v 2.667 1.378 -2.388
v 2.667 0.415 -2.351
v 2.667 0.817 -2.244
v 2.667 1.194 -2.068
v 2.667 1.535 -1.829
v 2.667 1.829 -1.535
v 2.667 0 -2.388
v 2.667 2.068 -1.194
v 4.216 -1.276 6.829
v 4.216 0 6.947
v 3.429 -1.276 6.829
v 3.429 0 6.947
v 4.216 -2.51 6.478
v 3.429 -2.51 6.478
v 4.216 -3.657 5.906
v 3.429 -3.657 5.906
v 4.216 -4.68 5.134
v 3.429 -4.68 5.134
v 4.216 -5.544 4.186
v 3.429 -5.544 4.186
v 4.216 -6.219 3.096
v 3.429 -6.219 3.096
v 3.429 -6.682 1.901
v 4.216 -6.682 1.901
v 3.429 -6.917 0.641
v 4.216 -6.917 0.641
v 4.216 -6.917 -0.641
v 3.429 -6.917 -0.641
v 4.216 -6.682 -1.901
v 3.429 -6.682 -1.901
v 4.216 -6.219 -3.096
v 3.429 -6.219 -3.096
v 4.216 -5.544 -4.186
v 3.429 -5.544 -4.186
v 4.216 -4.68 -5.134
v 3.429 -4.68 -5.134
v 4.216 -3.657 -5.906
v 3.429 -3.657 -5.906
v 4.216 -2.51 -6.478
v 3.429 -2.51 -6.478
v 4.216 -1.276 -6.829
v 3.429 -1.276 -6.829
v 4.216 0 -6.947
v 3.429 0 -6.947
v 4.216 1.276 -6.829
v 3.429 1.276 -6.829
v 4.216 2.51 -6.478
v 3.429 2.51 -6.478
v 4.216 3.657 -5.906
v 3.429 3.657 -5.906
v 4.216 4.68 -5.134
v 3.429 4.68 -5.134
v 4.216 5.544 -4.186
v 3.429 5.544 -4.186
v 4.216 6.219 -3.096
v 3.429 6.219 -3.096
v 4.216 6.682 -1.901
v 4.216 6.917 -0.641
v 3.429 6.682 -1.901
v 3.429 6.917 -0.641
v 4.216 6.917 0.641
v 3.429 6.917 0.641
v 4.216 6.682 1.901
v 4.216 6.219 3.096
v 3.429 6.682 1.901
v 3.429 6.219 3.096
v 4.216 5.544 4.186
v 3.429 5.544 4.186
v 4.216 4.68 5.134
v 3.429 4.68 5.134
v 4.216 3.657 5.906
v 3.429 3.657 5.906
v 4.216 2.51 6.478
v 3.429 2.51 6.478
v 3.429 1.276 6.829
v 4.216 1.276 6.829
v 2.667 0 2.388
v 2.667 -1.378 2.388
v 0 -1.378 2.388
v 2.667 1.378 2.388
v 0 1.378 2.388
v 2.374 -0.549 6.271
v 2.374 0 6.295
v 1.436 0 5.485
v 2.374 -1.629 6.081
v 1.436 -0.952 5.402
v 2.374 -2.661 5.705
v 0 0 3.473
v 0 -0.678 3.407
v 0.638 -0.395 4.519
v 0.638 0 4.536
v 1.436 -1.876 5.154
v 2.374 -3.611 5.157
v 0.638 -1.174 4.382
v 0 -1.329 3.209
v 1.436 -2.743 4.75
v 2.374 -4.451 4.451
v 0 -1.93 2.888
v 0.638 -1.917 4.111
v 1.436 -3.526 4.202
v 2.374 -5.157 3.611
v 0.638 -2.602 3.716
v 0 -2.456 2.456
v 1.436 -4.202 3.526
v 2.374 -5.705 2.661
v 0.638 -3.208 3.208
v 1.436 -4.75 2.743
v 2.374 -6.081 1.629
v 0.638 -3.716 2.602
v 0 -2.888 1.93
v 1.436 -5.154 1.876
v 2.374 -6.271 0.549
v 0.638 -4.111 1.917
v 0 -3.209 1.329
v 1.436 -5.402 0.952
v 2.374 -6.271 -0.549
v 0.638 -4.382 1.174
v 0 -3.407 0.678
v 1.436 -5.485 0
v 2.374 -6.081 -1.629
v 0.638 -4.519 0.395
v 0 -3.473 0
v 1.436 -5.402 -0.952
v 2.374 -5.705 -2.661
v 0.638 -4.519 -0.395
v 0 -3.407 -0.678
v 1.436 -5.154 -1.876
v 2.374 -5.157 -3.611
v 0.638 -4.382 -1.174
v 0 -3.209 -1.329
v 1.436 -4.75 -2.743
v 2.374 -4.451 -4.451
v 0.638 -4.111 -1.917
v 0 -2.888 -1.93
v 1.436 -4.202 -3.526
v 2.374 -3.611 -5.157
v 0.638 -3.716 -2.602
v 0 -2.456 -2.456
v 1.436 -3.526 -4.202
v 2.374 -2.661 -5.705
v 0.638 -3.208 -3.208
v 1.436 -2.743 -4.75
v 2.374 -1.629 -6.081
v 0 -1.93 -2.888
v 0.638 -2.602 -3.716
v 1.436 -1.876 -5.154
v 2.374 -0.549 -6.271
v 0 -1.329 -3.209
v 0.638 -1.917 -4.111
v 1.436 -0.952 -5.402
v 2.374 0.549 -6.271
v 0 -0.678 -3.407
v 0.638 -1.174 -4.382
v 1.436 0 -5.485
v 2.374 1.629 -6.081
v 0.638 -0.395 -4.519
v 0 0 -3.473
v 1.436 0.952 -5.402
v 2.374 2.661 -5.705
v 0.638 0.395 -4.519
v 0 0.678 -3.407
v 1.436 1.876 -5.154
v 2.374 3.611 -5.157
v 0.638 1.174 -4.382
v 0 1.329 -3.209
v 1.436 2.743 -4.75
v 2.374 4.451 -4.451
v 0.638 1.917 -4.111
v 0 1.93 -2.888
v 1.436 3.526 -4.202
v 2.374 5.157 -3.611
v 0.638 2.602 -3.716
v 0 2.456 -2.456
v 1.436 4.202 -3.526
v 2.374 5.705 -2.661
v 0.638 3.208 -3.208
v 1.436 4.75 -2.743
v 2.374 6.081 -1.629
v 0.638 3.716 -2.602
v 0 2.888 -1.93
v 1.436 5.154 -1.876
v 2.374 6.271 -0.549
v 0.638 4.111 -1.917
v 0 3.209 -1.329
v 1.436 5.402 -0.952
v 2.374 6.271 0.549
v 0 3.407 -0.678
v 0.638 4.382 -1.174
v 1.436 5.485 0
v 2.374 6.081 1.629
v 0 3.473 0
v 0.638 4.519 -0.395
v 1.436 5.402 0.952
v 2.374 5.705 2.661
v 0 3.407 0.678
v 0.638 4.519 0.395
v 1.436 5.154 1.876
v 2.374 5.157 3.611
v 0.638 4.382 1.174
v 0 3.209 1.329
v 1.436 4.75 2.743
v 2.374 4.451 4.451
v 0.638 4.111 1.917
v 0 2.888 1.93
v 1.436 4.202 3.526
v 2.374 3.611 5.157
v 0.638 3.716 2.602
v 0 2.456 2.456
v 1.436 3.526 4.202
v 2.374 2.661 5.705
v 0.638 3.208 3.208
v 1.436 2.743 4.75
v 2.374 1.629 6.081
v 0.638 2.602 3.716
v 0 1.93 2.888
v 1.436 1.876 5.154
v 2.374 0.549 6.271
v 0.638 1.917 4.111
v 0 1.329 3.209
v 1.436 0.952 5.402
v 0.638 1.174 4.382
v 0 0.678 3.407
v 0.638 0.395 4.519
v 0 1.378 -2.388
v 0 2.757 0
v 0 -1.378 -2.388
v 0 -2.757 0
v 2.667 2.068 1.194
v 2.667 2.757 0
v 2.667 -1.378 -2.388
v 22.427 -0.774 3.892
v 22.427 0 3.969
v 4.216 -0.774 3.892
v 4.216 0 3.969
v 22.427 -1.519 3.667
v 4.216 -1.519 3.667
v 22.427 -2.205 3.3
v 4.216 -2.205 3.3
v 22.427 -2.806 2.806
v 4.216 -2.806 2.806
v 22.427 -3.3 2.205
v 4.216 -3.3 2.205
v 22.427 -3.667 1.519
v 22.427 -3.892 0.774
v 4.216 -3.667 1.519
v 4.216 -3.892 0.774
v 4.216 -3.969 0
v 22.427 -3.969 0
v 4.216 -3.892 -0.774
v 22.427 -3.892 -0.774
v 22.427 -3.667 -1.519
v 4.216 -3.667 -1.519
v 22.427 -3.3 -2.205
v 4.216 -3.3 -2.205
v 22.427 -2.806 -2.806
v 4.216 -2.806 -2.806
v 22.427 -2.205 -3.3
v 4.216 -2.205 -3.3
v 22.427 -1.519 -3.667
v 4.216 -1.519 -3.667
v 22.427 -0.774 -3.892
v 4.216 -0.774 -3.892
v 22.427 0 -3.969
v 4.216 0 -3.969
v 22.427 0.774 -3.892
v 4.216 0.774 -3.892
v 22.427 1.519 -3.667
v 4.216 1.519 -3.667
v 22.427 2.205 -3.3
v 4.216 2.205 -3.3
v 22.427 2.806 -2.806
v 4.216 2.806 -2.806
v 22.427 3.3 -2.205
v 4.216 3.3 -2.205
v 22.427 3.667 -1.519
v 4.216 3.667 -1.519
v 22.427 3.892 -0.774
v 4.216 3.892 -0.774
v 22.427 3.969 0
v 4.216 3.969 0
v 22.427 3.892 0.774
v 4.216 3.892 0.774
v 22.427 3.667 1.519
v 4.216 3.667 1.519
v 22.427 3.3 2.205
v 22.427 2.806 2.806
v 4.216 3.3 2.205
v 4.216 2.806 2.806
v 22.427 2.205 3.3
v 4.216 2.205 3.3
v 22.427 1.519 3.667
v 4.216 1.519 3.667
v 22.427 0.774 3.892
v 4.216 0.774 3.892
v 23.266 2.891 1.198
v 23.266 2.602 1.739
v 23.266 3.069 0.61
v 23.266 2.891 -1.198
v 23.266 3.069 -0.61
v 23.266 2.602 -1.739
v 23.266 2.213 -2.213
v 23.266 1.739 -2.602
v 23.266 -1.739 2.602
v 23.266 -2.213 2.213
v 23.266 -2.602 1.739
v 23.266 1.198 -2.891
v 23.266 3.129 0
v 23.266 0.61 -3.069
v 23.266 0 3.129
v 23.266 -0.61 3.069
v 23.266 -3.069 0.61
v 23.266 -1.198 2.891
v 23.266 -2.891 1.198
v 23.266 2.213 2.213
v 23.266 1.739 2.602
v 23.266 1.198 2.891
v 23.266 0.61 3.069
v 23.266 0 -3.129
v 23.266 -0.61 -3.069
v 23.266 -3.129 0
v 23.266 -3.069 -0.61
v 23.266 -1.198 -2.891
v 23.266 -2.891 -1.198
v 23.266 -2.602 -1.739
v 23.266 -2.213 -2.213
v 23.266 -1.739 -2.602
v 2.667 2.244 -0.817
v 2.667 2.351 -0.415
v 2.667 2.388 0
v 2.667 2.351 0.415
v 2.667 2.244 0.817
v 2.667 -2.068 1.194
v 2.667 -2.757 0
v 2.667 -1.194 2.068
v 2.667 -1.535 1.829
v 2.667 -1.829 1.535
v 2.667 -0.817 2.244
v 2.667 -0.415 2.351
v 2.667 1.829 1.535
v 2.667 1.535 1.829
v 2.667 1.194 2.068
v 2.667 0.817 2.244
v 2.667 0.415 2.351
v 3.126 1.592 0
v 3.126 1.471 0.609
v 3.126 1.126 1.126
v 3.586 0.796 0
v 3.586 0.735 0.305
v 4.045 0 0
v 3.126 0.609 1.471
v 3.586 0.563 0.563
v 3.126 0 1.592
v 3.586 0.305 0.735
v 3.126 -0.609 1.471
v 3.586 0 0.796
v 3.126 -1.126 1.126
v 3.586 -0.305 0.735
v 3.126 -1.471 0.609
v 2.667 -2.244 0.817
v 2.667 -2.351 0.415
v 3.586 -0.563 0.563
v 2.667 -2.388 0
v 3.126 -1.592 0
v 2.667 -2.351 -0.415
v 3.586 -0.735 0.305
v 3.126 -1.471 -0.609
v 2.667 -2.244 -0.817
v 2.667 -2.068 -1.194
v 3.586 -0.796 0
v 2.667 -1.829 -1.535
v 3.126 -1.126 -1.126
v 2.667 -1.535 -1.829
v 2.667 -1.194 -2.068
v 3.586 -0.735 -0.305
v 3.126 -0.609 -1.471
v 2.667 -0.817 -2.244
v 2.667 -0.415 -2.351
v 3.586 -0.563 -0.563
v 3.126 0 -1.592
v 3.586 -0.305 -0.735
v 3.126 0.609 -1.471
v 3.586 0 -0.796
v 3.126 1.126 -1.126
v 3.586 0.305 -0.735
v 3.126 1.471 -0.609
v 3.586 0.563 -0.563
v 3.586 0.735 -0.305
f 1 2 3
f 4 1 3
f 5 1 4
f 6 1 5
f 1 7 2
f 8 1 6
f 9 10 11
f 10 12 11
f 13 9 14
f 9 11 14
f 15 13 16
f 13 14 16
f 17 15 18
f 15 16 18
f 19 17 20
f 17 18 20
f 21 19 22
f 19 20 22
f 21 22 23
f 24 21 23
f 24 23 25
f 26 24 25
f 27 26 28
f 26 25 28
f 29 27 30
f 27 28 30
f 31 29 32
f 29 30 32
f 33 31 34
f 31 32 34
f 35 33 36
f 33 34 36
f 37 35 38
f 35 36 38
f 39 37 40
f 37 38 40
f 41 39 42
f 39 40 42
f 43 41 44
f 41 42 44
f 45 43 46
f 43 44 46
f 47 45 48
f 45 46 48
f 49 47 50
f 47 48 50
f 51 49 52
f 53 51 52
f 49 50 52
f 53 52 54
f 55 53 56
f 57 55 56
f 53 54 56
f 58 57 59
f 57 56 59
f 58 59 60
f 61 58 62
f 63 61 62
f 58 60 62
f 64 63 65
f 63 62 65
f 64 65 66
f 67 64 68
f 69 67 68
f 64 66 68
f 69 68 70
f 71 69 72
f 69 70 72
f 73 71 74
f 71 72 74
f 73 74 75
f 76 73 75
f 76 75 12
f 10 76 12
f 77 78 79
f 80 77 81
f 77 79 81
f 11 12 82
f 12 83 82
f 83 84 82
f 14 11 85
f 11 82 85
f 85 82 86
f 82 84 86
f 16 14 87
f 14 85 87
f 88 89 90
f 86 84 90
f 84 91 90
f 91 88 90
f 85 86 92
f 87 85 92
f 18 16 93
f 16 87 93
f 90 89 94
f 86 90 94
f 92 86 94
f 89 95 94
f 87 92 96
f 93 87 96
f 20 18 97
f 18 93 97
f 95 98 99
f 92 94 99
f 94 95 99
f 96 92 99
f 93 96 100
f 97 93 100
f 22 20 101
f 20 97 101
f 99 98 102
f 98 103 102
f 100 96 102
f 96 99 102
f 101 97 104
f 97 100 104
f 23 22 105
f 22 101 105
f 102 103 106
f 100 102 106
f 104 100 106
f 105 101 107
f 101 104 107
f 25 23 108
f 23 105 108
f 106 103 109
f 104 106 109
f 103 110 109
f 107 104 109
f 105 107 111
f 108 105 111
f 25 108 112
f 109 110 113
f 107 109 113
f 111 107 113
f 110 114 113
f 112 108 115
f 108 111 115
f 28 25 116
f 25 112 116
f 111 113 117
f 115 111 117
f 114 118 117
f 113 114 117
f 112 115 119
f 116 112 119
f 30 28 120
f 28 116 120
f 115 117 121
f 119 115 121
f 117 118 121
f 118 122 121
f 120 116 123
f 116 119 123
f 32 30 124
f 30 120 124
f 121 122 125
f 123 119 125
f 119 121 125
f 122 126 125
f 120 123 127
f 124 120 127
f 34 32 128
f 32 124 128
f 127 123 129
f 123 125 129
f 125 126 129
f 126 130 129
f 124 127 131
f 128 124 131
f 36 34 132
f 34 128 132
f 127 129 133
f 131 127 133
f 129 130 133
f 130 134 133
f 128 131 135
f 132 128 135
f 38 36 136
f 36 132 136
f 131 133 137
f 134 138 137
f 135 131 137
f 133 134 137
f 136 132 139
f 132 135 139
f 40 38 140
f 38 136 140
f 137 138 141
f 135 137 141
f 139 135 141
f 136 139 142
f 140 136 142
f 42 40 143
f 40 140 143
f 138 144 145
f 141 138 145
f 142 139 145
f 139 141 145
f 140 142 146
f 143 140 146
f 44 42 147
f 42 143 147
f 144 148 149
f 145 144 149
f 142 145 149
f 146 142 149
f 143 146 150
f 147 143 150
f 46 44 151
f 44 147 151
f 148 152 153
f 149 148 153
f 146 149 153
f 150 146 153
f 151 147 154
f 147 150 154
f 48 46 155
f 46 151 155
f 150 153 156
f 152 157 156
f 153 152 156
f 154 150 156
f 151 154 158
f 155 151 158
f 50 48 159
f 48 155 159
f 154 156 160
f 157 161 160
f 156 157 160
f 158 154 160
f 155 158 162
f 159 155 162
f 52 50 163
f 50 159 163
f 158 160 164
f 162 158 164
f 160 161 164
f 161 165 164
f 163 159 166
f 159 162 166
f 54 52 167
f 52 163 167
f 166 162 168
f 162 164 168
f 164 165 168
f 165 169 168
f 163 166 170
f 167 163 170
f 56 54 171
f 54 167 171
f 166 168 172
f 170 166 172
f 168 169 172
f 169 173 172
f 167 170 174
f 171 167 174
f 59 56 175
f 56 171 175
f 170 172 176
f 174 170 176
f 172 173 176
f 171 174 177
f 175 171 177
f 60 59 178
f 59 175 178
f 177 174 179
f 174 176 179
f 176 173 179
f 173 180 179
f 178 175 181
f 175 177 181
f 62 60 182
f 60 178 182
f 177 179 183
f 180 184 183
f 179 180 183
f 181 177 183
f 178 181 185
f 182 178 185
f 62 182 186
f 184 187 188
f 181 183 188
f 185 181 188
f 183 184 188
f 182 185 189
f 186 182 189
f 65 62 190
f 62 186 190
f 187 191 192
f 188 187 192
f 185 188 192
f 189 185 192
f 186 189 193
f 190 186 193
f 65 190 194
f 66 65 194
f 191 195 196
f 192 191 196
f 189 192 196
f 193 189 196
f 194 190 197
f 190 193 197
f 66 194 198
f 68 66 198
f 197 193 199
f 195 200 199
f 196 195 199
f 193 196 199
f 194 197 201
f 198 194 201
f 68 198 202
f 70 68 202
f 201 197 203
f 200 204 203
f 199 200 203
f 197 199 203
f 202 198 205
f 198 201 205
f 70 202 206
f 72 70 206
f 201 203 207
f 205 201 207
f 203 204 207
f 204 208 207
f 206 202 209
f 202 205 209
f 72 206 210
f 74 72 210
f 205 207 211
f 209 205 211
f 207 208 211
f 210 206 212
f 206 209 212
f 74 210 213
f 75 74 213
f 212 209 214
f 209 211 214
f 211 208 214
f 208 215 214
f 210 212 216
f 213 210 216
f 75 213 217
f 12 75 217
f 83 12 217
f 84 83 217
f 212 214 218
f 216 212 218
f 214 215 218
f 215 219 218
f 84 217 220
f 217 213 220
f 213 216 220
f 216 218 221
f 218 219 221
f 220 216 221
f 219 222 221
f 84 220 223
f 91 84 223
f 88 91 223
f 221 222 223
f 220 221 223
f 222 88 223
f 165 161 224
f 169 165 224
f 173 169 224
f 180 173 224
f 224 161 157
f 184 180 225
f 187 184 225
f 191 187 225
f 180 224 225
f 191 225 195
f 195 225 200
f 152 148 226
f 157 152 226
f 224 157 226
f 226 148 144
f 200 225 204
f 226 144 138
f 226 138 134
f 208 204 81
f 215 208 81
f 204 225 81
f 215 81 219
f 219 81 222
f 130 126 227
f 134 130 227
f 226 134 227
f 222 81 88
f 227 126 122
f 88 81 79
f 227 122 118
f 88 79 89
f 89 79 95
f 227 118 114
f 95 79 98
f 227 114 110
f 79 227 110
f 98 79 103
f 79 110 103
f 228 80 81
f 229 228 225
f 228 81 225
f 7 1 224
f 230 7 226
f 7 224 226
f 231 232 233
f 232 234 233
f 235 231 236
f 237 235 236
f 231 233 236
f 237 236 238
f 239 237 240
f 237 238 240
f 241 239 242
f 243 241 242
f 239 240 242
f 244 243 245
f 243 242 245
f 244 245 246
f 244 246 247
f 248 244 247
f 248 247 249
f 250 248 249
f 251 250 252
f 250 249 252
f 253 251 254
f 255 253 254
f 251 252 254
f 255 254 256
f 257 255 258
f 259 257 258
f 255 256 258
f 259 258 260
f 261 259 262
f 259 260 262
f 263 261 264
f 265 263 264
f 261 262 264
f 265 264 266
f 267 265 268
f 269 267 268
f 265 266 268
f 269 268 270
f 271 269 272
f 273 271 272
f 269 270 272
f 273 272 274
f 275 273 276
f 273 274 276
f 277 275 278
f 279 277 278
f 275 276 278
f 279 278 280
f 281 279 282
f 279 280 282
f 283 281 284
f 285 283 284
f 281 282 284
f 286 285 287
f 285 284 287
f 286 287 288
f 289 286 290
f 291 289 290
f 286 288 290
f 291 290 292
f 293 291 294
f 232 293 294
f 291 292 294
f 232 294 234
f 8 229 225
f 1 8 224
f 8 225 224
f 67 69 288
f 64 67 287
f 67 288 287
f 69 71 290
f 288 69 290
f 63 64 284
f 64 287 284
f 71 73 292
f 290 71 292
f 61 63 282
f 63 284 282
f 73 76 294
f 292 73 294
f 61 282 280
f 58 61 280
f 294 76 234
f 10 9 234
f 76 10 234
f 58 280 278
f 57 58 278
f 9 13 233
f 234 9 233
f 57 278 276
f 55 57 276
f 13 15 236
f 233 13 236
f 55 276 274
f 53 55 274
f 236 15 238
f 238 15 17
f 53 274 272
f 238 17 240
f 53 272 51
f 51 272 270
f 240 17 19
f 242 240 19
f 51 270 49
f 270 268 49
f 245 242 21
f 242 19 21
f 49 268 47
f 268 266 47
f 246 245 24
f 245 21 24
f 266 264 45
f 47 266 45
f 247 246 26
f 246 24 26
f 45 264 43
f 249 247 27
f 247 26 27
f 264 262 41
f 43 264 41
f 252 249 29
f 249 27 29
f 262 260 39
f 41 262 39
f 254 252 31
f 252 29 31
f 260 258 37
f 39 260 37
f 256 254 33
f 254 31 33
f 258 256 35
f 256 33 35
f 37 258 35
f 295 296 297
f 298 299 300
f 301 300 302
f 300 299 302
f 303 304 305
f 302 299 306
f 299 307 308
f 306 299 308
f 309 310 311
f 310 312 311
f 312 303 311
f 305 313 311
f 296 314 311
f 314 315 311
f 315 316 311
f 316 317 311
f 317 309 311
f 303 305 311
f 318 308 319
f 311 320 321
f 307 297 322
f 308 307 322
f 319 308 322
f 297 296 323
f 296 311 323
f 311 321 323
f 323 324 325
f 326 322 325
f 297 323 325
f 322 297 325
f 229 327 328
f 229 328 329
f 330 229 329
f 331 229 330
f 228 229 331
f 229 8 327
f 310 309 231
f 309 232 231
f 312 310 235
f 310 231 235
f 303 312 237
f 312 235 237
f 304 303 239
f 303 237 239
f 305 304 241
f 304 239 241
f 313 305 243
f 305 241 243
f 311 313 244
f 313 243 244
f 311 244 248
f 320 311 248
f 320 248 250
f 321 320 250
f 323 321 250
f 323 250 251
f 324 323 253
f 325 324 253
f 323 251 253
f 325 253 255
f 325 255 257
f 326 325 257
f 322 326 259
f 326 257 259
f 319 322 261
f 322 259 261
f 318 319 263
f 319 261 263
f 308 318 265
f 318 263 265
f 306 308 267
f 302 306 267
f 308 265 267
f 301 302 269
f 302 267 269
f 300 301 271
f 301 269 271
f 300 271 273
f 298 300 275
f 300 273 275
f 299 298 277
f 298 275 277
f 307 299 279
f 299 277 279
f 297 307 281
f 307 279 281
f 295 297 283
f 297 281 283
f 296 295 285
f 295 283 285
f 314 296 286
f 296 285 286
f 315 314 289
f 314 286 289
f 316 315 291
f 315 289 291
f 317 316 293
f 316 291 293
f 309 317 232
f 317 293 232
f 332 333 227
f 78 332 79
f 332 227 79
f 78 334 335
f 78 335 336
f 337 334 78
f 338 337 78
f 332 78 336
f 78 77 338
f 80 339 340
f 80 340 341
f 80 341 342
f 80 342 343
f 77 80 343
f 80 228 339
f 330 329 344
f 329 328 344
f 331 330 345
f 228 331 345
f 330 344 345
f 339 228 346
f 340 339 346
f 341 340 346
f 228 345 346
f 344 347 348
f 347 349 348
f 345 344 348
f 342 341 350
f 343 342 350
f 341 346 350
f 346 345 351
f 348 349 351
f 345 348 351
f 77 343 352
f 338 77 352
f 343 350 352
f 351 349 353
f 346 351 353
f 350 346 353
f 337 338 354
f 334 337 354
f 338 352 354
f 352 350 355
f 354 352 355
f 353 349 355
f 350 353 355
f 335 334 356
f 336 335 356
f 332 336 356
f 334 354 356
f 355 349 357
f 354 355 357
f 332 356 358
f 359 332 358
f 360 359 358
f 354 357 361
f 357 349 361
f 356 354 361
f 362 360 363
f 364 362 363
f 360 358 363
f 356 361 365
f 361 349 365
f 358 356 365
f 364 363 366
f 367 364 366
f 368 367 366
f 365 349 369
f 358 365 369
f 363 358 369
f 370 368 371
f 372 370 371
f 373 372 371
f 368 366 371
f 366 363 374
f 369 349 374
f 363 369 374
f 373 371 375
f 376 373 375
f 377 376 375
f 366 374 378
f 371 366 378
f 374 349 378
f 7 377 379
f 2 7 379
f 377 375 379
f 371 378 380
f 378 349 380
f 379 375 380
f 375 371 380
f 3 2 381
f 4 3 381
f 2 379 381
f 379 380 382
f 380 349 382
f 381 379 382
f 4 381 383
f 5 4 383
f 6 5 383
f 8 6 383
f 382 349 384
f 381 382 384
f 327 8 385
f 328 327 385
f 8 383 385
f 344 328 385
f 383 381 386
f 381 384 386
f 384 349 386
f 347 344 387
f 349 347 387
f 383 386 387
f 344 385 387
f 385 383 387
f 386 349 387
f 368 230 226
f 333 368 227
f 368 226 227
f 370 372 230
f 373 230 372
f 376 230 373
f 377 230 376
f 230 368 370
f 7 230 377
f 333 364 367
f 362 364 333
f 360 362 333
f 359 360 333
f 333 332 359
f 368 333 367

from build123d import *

# Parameters (mm, degrees)
HEX_2_DEPTH = 2.667


with BuildPart() as part:
    # BodySke → BaseBody (revolve)
    with BuildSketch(Plane.XY, mode=Mode.PRIVATE) as basebody_sk:
        with BuildLine():
            Line((23.2664, 0), (23.2664, 3.12928))
            Line((23.2664, 3.12928), (22.42693, 3.96875))
            Line((22.42693, 3.96875), (4.2164, 3.96875))
            Line((4.2164, 3.96875), (4.2164, 6.9469))
            Line((4.2164, 6.9469), (3.429, 6.9469))
            ThreePointArc((3.429, 6.9469), (1.436093175, 5.485019032), (0, 3.47345))
            Line((0, 3.47345), (0, 0))
            Line((0, 0), (23.2664, 0))
        make_face()
    revolve(basebody_sk.sketch.rotate(Axis((0, 0, 0), (1, 0, 0)), 90), axis=Axis((0, 0, 0), (1, 0, 0)))

    # Sketch2 → PreBroach (revolve, cut)
    with BuildSketch(Plane.XY):
        Polygon((0, 2.3876), (2.667, 2.3876), (4.045481503, 0), (0, 0), align=None)
    revolve(axis=Axis((0, 0, 0), (1, 0, 0)), mode=Mode.SUBTRACT)

    # Sketch3 → Hex 2 (cut)
    with BuildSketch(Plane(origin=(0, 0, 0), x_dir=(0, 0, -1), z_dir=(1, 0, 0))):
        Polygon((-2.3876, -1.378481503), (-2.3876, 1.378481503), (0, 2.756963005), (2.3876, 1.378481503), (2.3876, -1.378481503), (0, -2.756963005), align=None)
    extrude(amount=HEX_2_DEPTH, mode=Mode.SUBTRACT)


solid = part.part
